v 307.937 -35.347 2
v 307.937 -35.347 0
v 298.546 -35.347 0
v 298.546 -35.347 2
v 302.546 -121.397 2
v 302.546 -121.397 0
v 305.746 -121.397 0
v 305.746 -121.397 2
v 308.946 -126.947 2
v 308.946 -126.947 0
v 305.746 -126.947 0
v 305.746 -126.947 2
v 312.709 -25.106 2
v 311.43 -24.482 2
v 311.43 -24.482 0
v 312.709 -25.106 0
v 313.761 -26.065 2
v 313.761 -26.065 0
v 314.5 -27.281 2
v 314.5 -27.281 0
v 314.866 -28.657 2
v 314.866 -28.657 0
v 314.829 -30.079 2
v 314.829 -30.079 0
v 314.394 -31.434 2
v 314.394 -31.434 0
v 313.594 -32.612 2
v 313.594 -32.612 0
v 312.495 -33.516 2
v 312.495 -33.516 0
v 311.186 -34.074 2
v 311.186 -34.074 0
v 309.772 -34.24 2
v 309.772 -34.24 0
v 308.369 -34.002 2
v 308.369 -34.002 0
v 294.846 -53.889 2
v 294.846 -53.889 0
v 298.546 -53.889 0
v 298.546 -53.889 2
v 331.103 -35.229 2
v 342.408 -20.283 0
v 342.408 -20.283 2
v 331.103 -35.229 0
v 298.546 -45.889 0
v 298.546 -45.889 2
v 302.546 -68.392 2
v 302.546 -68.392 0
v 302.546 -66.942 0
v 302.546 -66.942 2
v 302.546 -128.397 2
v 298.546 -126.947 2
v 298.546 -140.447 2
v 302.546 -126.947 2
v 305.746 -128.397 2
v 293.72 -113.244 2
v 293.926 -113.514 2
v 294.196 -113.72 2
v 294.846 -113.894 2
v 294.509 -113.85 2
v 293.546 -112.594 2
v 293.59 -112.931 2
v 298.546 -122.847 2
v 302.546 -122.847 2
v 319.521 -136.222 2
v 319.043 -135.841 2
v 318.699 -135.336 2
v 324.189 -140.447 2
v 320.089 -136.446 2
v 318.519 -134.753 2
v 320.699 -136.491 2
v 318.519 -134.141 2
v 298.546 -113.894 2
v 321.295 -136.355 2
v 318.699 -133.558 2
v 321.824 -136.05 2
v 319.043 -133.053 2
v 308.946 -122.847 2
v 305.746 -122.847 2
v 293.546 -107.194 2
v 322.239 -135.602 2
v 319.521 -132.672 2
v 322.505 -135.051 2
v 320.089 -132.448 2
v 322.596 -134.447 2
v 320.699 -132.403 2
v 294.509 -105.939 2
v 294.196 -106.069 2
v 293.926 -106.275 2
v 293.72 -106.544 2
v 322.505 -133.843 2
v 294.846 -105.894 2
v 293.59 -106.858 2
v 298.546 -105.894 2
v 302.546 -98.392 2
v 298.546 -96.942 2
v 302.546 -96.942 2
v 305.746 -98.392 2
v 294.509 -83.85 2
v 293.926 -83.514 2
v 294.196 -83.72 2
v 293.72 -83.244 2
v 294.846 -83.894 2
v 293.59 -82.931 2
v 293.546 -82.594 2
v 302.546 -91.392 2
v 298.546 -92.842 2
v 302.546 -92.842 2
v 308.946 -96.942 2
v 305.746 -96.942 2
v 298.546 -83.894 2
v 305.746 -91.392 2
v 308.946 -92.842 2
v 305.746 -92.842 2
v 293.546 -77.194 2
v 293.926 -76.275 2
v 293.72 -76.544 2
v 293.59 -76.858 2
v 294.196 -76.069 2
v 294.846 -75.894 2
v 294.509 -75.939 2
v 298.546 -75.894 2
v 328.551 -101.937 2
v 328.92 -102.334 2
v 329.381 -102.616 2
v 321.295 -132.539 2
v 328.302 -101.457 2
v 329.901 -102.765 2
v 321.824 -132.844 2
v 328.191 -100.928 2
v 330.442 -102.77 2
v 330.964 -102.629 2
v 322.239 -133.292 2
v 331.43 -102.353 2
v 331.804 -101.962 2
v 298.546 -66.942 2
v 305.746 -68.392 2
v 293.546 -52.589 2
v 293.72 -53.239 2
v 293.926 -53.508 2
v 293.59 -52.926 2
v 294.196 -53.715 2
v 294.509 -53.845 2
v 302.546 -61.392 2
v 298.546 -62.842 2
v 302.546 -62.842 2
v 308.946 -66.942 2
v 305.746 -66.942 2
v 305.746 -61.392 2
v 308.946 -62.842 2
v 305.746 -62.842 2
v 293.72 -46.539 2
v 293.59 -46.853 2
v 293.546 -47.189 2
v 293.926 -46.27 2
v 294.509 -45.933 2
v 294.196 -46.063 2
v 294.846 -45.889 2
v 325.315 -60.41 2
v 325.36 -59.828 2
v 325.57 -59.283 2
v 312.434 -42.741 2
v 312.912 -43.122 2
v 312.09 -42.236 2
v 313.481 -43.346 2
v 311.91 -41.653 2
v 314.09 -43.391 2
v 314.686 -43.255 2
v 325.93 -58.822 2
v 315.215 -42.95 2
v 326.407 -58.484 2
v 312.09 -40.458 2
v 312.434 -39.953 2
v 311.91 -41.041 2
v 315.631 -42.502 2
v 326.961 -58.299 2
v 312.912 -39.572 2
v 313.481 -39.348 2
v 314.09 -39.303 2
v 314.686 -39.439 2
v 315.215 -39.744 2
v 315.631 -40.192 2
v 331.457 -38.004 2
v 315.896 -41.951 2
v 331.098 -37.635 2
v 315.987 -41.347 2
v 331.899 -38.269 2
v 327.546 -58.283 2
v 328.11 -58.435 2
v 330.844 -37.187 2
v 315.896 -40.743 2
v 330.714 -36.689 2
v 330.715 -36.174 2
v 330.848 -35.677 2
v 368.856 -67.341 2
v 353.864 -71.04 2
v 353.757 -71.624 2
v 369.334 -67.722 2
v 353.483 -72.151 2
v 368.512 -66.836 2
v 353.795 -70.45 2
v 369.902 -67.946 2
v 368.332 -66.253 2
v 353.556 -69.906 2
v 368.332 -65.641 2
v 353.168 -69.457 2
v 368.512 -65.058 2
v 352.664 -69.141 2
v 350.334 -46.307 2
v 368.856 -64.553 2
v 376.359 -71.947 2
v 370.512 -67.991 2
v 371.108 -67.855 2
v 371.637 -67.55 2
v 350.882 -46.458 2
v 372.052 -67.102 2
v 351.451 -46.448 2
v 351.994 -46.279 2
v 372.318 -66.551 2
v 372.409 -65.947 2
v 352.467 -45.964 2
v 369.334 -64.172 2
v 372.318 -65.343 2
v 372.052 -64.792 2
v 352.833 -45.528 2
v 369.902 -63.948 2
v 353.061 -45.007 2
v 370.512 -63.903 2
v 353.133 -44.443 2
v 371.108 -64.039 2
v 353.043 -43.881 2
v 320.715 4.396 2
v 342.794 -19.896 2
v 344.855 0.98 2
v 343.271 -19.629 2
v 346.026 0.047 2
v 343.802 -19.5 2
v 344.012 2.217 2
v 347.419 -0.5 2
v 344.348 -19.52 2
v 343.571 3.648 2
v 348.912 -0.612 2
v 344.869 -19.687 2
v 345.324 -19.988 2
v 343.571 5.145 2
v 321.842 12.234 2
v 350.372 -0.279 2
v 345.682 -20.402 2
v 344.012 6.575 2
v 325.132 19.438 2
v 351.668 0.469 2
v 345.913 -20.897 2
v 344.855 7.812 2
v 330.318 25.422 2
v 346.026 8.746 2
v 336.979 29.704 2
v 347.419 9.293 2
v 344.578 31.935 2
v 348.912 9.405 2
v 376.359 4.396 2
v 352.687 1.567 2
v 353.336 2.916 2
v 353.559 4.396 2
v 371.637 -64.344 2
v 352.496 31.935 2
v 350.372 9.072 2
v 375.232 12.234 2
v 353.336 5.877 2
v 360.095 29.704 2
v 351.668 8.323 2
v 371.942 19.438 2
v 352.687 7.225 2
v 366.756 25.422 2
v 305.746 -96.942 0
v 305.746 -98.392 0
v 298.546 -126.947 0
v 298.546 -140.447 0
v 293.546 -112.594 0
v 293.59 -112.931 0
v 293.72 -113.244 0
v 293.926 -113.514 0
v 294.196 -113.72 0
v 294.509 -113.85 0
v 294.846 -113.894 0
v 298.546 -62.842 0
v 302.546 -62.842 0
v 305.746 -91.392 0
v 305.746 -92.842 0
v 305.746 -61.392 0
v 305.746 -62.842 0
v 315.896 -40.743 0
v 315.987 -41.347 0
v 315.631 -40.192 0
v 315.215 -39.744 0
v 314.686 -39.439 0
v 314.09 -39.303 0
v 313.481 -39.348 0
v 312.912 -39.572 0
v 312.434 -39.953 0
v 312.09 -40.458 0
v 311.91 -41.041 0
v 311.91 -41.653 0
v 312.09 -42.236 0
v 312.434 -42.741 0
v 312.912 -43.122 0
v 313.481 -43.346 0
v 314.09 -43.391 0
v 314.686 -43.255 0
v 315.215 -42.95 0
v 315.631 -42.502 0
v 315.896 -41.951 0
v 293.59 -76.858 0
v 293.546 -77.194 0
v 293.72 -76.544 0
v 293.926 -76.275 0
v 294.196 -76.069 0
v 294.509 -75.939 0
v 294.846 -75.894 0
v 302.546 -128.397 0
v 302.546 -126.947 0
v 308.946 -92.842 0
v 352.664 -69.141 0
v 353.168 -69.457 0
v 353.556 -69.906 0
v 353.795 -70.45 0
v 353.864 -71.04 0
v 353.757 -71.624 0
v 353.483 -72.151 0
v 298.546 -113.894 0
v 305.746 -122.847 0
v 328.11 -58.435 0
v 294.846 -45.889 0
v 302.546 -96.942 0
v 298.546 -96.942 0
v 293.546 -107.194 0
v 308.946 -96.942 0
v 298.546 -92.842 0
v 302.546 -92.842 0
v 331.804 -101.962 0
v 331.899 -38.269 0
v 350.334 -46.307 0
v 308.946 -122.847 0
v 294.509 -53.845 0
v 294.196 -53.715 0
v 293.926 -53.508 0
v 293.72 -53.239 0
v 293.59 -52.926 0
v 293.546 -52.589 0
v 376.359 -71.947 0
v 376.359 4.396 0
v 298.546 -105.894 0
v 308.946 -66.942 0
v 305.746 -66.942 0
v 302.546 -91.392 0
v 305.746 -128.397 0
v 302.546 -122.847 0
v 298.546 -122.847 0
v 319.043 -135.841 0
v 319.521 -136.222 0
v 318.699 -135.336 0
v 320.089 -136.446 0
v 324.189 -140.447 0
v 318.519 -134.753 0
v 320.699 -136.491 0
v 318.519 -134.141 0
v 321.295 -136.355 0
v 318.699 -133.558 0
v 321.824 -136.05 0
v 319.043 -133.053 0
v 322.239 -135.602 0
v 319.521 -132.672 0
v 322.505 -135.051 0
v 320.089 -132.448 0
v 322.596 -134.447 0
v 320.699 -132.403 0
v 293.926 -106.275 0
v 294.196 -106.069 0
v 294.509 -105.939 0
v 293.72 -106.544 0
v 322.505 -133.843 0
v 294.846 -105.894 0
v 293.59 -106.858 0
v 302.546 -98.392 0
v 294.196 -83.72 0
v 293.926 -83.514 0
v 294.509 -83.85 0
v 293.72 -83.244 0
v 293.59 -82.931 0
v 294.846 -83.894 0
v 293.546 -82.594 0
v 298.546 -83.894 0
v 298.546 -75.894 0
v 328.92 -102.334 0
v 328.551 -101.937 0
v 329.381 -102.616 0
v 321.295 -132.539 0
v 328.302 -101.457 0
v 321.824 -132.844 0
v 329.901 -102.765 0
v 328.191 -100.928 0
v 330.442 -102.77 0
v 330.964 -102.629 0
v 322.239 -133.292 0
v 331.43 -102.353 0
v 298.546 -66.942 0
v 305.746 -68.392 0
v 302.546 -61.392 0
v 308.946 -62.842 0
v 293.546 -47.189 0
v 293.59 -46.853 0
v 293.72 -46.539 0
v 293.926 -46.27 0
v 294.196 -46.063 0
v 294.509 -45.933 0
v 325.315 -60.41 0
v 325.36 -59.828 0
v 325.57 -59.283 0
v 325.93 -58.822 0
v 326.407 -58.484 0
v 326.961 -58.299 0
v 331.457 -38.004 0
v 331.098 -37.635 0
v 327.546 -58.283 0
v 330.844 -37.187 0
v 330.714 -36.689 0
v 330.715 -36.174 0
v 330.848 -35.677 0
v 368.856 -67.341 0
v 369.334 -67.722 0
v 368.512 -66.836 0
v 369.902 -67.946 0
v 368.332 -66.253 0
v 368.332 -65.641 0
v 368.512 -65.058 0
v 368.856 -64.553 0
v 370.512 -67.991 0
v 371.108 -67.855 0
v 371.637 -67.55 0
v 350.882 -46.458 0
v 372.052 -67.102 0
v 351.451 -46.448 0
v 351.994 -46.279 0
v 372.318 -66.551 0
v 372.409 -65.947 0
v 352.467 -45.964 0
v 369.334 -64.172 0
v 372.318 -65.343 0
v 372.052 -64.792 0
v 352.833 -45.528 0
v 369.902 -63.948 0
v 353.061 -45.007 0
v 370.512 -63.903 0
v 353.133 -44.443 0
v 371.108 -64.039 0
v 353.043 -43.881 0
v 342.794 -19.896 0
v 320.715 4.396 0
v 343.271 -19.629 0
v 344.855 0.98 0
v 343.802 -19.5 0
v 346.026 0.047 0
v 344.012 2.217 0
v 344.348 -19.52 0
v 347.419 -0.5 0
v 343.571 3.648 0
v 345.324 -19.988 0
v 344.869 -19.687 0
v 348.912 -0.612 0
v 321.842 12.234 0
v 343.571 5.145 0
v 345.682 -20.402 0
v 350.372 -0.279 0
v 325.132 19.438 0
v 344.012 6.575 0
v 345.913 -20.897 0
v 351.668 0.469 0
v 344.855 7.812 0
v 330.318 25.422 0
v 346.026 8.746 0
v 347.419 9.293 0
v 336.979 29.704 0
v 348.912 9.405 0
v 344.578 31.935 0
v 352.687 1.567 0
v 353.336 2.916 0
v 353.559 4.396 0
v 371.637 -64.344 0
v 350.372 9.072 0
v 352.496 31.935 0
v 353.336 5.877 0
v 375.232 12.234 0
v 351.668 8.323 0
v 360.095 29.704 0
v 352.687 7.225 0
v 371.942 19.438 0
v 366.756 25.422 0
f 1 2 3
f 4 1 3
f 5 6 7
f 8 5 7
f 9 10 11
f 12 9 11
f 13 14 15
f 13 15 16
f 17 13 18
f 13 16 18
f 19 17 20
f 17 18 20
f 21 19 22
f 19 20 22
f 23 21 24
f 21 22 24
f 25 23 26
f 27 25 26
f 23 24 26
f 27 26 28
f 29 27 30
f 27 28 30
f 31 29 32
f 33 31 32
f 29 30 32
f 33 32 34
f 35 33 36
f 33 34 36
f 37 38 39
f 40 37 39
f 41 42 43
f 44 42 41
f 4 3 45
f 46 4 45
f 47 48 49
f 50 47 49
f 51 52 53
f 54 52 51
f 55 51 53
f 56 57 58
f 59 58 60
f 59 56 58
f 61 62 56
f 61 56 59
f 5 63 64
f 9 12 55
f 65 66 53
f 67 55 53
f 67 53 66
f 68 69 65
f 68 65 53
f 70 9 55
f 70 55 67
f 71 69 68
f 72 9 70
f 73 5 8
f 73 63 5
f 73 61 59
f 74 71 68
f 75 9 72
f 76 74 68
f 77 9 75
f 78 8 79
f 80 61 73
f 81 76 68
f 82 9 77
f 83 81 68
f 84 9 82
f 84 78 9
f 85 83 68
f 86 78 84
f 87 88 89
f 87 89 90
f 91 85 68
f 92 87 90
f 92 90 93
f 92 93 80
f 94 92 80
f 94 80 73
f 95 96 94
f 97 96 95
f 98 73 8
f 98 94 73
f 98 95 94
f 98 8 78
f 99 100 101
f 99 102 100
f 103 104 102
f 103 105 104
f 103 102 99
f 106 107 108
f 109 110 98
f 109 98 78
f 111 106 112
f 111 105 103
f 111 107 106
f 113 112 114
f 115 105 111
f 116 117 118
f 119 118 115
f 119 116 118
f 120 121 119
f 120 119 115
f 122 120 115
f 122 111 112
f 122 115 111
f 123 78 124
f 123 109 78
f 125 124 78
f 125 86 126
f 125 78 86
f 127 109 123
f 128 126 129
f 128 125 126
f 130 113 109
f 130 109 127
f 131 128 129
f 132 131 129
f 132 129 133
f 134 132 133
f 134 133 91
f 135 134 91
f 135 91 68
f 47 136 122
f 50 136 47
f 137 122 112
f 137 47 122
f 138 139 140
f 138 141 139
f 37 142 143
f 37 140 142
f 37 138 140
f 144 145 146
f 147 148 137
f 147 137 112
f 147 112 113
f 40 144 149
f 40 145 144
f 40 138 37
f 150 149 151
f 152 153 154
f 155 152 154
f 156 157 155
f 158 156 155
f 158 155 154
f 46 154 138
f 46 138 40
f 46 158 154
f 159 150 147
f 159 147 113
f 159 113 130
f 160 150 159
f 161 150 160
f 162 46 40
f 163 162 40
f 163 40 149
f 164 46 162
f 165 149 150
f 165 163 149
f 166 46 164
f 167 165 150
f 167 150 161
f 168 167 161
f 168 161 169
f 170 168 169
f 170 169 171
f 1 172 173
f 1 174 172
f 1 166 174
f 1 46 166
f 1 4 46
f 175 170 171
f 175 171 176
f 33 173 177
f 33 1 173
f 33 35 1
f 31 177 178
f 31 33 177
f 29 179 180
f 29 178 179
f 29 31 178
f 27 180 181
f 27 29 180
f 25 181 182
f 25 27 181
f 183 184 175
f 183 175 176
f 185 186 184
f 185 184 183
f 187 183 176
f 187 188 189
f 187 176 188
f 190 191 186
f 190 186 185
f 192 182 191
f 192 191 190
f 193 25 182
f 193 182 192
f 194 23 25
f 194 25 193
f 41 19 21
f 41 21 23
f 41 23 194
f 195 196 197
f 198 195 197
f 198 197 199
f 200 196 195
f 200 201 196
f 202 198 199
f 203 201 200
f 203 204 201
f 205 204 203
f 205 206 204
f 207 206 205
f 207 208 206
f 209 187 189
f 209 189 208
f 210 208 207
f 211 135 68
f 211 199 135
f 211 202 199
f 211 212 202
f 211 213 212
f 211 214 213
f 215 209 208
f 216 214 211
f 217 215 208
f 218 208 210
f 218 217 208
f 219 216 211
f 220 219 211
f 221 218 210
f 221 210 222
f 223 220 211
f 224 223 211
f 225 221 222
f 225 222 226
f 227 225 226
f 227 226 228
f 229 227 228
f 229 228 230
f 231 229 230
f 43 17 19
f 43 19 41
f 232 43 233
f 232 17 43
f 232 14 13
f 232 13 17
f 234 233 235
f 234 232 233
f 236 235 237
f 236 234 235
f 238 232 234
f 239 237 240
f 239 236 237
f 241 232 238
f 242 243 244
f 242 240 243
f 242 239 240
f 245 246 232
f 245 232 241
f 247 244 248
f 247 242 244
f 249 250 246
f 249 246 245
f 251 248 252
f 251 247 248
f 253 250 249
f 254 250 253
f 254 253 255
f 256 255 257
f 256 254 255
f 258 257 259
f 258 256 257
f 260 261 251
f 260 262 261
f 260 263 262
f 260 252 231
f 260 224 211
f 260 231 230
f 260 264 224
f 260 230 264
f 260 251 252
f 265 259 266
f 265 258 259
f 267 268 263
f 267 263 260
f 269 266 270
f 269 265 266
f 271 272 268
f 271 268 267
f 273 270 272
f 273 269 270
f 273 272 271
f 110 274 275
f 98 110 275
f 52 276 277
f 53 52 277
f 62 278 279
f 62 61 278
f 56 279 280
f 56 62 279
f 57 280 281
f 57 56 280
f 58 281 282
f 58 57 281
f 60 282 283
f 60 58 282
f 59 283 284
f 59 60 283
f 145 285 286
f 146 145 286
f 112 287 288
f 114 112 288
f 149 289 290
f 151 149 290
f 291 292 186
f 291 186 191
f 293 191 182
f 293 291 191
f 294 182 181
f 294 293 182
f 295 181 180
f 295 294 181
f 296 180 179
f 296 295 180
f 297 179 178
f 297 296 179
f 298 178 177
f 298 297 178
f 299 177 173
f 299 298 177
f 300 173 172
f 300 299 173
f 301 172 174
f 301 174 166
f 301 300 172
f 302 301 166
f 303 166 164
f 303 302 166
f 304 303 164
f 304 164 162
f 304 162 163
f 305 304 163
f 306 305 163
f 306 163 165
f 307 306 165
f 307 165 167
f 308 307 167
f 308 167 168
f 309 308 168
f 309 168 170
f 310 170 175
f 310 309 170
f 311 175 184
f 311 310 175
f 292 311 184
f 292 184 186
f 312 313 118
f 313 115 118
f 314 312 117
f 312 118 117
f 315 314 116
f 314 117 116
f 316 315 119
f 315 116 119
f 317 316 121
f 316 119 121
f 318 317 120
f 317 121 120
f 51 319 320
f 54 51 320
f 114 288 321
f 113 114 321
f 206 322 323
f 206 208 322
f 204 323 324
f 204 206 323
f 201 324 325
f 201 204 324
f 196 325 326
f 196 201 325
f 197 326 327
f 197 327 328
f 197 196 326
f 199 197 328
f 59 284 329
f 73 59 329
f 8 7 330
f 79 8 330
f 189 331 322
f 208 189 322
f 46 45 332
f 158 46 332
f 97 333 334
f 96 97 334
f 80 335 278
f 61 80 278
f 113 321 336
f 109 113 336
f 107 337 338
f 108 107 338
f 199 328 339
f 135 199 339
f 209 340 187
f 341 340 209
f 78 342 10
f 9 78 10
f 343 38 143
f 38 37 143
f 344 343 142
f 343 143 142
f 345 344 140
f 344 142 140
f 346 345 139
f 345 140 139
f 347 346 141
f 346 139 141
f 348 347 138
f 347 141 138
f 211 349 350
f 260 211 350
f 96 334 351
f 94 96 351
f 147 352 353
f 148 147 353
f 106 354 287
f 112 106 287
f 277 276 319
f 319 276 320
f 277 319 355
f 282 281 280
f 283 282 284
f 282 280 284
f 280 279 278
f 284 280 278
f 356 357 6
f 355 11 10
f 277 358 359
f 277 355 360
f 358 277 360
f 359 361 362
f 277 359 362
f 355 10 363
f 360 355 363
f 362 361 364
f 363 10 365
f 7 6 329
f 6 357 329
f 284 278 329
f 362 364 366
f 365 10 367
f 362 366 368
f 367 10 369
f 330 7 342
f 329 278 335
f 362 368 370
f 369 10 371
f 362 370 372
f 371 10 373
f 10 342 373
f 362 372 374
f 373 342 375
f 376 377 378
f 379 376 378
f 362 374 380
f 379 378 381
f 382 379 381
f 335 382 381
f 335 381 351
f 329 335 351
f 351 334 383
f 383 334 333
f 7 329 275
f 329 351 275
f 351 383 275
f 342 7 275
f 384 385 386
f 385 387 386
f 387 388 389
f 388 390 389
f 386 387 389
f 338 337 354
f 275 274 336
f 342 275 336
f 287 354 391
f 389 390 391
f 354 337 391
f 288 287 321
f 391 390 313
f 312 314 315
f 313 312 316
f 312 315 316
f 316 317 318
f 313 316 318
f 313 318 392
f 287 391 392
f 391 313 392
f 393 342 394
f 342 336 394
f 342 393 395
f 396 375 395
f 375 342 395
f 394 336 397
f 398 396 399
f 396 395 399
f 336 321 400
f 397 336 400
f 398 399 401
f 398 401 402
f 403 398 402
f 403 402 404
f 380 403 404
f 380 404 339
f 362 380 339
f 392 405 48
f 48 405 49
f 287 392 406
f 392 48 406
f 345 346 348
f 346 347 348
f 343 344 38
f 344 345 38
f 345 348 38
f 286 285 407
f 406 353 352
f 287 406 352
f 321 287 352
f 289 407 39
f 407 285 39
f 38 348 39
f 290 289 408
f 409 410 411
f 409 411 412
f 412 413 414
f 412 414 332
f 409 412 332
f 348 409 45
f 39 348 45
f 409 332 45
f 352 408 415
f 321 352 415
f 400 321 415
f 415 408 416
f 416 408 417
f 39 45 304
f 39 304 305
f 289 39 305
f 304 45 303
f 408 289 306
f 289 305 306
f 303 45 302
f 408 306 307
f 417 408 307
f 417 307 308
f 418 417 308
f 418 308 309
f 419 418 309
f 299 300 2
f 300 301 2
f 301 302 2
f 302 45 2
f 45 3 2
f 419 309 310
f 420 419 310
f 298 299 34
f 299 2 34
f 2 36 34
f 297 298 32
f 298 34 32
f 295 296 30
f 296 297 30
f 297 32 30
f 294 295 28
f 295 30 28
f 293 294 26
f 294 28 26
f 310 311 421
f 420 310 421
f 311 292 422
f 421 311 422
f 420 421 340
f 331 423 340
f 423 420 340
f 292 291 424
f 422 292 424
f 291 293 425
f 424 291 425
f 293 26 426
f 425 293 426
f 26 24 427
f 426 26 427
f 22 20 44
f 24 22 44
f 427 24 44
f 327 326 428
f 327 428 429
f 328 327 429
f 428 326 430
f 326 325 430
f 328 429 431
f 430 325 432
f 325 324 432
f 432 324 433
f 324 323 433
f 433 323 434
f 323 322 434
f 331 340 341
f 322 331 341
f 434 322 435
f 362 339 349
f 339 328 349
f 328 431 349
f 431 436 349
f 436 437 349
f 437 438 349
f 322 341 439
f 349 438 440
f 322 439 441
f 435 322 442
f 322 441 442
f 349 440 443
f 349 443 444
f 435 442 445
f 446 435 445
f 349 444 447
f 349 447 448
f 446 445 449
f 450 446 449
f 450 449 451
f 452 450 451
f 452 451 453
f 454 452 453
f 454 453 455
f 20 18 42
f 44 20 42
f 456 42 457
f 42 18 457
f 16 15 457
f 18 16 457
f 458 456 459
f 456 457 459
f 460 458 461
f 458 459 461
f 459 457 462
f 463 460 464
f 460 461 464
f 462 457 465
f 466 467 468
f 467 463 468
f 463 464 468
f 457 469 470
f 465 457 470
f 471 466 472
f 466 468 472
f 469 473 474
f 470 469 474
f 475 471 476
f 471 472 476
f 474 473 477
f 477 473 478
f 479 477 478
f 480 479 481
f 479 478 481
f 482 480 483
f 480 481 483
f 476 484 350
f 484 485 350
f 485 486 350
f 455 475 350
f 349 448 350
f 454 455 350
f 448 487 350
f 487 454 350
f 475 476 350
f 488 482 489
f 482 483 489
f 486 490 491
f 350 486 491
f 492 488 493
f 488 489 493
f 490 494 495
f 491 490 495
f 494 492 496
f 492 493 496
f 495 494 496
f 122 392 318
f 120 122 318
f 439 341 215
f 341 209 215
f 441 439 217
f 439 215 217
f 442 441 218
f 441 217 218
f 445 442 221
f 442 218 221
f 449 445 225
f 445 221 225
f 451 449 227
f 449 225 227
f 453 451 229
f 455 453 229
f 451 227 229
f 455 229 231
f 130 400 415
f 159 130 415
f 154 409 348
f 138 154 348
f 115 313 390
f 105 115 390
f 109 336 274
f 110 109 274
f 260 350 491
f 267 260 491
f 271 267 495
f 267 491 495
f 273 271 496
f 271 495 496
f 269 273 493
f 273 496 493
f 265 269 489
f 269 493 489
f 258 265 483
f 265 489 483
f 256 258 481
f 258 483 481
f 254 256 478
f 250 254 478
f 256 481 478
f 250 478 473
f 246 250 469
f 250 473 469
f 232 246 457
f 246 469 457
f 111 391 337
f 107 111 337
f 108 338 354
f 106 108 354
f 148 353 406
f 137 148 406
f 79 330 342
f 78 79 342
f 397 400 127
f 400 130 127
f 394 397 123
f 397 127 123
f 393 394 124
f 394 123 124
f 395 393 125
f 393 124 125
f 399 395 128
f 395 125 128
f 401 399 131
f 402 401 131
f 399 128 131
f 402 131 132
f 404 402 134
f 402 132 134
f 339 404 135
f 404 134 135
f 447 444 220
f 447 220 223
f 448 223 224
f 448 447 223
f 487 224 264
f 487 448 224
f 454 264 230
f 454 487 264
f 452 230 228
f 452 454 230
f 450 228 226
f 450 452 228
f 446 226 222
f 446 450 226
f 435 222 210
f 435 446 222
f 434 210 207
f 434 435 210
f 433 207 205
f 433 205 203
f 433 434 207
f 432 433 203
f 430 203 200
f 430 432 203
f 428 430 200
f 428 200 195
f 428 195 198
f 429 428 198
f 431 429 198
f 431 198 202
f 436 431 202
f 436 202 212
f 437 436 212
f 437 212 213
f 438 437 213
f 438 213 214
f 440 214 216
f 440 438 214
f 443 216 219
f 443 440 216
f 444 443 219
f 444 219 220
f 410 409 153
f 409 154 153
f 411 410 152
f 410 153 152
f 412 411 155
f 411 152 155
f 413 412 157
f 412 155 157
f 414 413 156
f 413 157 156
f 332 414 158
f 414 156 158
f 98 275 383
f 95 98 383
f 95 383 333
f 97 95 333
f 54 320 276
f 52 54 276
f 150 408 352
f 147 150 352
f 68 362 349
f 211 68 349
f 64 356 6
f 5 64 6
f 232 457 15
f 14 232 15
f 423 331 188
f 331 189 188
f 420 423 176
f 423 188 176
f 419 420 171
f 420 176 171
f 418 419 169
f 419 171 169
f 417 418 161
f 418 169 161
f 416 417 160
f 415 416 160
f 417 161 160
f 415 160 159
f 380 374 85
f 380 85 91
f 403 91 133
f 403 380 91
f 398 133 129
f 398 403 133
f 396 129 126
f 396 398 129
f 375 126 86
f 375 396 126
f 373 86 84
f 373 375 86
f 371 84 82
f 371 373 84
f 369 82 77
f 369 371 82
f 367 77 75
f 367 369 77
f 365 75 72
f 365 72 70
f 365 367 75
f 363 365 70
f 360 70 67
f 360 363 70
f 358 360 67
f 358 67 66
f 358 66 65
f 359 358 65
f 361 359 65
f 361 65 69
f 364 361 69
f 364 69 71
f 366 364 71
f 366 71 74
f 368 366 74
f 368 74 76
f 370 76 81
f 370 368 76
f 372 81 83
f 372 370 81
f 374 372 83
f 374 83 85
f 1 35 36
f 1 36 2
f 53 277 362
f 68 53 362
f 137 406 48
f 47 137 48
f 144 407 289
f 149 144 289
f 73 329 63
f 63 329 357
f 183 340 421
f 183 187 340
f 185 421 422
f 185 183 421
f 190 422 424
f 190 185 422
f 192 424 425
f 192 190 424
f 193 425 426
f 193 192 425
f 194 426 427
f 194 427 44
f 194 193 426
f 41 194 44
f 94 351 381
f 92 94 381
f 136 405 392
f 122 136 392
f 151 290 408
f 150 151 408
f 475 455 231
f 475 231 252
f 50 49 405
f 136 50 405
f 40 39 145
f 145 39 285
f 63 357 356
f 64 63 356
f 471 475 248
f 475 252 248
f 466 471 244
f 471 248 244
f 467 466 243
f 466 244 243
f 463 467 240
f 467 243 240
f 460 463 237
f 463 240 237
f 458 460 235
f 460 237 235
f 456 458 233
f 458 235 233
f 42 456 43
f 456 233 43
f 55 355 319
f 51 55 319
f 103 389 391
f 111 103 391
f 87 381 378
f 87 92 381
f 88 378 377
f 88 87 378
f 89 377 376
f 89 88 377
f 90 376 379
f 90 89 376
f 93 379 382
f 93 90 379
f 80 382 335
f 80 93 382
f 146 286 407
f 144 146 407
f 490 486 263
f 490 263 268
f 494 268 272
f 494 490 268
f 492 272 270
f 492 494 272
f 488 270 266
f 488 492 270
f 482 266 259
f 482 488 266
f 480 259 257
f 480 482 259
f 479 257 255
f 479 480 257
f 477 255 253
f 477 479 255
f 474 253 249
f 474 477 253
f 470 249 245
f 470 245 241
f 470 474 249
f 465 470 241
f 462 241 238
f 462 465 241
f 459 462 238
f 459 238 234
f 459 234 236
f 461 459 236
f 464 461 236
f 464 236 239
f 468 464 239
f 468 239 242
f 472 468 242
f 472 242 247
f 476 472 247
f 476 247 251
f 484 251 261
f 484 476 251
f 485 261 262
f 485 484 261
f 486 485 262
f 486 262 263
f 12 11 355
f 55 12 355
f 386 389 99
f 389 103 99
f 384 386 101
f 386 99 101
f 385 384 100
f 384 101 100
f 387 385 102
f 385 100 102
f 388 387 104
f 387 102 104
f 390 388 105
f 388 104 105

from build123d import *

# Parameters (mm, degrees)
SKETCH_1_R          = 5.0225
SKETCH_1_R_2        = 2.05
EXTRUDE_1_DEPTH     = 2
FILLET_1_R          = 2
FILLET_2_R          = 1.3
SKETCH_3_R          = 5
CUT_EXTRUDE_1_DEPTH = 2


with BuildPart() as part:
    # 草图1 → 凸台-拉伸1 (new body)
    with BuildSketch(Plane.XY):
        with BuildLine():
            Line((298.545628784, -83.894391363), (298.545628784, -92.841778663))
            Line((298.545628784, -92.841778663), (302.545628784, -92.841778663))
            Line((302.545628784, -92.841778663), (302.545628784, -91.391778663))
            Line((302.545628784, -91.391778663), (305.745628784, -91.391778663))
            Line((305.745628784, -91.391778663), (305.745628784, -92.841778663))
            Line((305.745628784, -92.841778663), (308.945628784, -92.841778663))
            Line((308.945628784, -92.841778663), (308.945628784, -96.941778663))
            Line((308.945628784, -96.941778663), (305.745628784, -96.941778663))
            Line((305.745628784, -96.941778663), (305.745628784, -98.391778663))
            Line((305.745628784, -98.391778663), (302.545628784, -98.391778663))
            Line((302.545628784, -98.391778663), (302.545628784, -96.941778663))
            Line((302.545628784, -96.941778663), (298.545628784, -96.941778663))
            Line((298.545628784, -96.941778663), (298.545628784, -105.894391358))
            Line((298.545628784, -105.894391358), (293.545628784, -105.894391358))
            Line((293.545628784, -105.894391358), (293.545628784, -113.894391358))
            Line((293.545628784, -113.894391358), (298.545628784, -113.894391358))
            Line((298.545628784, -113.894391358), (298.545628784, -122.847004054))
            Line((298.545628784, -122.847004054), (302.545628784, -122.847004054))
            Line((302.545628784, -122.847004054), (302.545628784, -121.397004054))
            Line((302.545628784, -121.397004054), (305.745628784, -121.397004054))
            Line((305.745628784, -121.397004054), (305.745628784, -122.847004054))
            Line((305.745628784, -122.847004054), (308.945628784, -122.847004054))
            Line((308.945628784, -122.847004054), (308.945628784, -126.947004054))
            Line((308.945628784, -126.947004054), (305.745628784, -126.947004054))
            Line((305.745628784, -126.947004054), (305.745628784, -128.397004054))
            Line((305.745628784, -128.397004054), (302.545628784, -128.397004054))
            Line((302.545628784, -128.397004054), (302.545628784, -126.947004054))
            Line((302.545628784, -126.947004054), (298.545628784, -126.947004054))
            Line((298.545628784, -126.947004054), (298.545628784, -140.447004054))
            Line((298.545628784, -140.447004054), (324.188862368, -140.447004054))
            Line((324.188862368, -140.447004054), (376.358604426, -71.946984141))
            Line((376.358604426, -71.946984141), (376.358604426, 4.396201153))
            ThreePointArc((376.358604426, 4.396201153), (348.536987634, 32.217817945), (320.715370843, 4.396201153))
            Line((320.715370843, 4.396201153), (307.936987634, -35.346984141))
            Line((307.936987634, -35.346984141), (298.545628784, -35.346984141))
            Line((298.545628784, -35.346984141), (298.545628784, -45.889165972))
            Line((298.545628784, -45.889165972), (293.545628784, -45.889165972))
            Line((293.545628784, -45.889165972), (293.545628784, -53.889165972))
            Line((293.545628784, -53.889165972), (298.545628784, -53.889165972))
            Line((298.545628784, -53.889165972), (298.545628784, -62.841778668))
            Line((298.545628784, -62.841778668), (302.545628784, -62.841778668))
            Line((302.545628784, -62.841778668), (302.545628784, -61.391778668))
            Line((302.545628784, -61.391778668), (305.745628784, -61.391778668))
            Line((305.745628784, -61.391778668), (305.745628784, -62.841778668))
            Line((305.745628784, -62.841778668), (308.945628784, -62.841778668))
            Line((308.945628784, -62.841778668), (308.945628784, -66.941778668))
            Line((308.945628784, -66.941778668), (305.745628784, -66.941778668))
            Line((305.745628784, -66.941778668), (305.745628784, -68.391778668))
            Line((305.745628784, -68.391778668), (302.545628784, -68.391778668))
            Line((302.545628784, -68.391778668), (302.545628784, -66.941778668))
            Line((302.545628784, -66.941778668), (298.545628784, -66.941778668))
            Line((298.545628784, -66.941778668), (298.545628784, -75.894391363))
            Line((298.545628784, -75.894391363), (293.545628784, -75.894391363))
            Line((293.545628784, -75.894391363), (293.545628784, -83.894391363))
            Line((293.545628784, -83.894391363), (298.545628784, -83.894391363))
        make_face()
        with Locations((348.536987634, 4.396201153)):
            Circle(SKETCH_1_R, mode=Mode.SUBTRACT)
        with Locations((320.545628784, -134.447004054)):
            Circle(SKETCH_1_R_2, mode=Mode.SUBTRACT)
        with Locations((370.358604426, -65.946984141)):
            Circle(SKETCH_1_R_2, mode=Mode.SUBTRACT)
        with Locations((313.936987634, -41.346984141)):
            Circle(SKETCH_1_R_2, mode=Mode.SUBTRACT)
        Polygon((354.947285032, -70.136765586), (328.579617375, -106.396108383), (325.08144343, -57.115165973), align=None, mode=Mode.SUBTRACT)
        Polygon((329.571126451, -37.254352656), (354.337315751, -48.052488042), (344.758747766, -17.175445836), align=None, mode=Mode.SUBTRACT)
    extrude(amount=EXTRUDE_1_DEPTH)

    # 圆角1
    fillet_1_edges = [part.edges().sort_by_distance(p)[0] for p in [
        (354.947285032, -70.136765586, 1),
        (325.08144343, -57.115165973, 1),
        (328.579617375, -106.396108383, 1),
        (344.758747766, -17.175445836, 1),
        (329.571126451, -37.254352656, 1),
        (354.337315751, -48.052488042, 1),
    ]]
    fillet(fillet_1_edges, radius=FILLET_1_R)

    # 圆角2
    fillet_2_edges = [part.edges().sort_by_distance(p)[0] for p in [
        (293.545628784, -113.894391358, 1),
        (293.545628784, -105.894391358, 1),
        (293.545628784, -83.894391363, 1),
        (293.545628784, -75.894391363, 1),
        (293.545628784, -53.889165972, 1),
        (293.545628784, -45.889165972, 1),
    ]]
    fillet(fillet_2_edges, radius=FILLET_2_R)

    # 草图3 → 切除-拉伸1 (cut)
    with BuildSketch(Plane(origin=(0, 0, 0), x_dir=(-1, 0, 0), z_dir=(0, 0, -1))):
        with Locations((-309.899887982, -29.241993317)):
            Circle(SKETCH_3_R)
    extrude(amount=-CUT_EXTRUDE_1_DEPTH, mode=Mode.SUBTRACT)


solid = part.part
